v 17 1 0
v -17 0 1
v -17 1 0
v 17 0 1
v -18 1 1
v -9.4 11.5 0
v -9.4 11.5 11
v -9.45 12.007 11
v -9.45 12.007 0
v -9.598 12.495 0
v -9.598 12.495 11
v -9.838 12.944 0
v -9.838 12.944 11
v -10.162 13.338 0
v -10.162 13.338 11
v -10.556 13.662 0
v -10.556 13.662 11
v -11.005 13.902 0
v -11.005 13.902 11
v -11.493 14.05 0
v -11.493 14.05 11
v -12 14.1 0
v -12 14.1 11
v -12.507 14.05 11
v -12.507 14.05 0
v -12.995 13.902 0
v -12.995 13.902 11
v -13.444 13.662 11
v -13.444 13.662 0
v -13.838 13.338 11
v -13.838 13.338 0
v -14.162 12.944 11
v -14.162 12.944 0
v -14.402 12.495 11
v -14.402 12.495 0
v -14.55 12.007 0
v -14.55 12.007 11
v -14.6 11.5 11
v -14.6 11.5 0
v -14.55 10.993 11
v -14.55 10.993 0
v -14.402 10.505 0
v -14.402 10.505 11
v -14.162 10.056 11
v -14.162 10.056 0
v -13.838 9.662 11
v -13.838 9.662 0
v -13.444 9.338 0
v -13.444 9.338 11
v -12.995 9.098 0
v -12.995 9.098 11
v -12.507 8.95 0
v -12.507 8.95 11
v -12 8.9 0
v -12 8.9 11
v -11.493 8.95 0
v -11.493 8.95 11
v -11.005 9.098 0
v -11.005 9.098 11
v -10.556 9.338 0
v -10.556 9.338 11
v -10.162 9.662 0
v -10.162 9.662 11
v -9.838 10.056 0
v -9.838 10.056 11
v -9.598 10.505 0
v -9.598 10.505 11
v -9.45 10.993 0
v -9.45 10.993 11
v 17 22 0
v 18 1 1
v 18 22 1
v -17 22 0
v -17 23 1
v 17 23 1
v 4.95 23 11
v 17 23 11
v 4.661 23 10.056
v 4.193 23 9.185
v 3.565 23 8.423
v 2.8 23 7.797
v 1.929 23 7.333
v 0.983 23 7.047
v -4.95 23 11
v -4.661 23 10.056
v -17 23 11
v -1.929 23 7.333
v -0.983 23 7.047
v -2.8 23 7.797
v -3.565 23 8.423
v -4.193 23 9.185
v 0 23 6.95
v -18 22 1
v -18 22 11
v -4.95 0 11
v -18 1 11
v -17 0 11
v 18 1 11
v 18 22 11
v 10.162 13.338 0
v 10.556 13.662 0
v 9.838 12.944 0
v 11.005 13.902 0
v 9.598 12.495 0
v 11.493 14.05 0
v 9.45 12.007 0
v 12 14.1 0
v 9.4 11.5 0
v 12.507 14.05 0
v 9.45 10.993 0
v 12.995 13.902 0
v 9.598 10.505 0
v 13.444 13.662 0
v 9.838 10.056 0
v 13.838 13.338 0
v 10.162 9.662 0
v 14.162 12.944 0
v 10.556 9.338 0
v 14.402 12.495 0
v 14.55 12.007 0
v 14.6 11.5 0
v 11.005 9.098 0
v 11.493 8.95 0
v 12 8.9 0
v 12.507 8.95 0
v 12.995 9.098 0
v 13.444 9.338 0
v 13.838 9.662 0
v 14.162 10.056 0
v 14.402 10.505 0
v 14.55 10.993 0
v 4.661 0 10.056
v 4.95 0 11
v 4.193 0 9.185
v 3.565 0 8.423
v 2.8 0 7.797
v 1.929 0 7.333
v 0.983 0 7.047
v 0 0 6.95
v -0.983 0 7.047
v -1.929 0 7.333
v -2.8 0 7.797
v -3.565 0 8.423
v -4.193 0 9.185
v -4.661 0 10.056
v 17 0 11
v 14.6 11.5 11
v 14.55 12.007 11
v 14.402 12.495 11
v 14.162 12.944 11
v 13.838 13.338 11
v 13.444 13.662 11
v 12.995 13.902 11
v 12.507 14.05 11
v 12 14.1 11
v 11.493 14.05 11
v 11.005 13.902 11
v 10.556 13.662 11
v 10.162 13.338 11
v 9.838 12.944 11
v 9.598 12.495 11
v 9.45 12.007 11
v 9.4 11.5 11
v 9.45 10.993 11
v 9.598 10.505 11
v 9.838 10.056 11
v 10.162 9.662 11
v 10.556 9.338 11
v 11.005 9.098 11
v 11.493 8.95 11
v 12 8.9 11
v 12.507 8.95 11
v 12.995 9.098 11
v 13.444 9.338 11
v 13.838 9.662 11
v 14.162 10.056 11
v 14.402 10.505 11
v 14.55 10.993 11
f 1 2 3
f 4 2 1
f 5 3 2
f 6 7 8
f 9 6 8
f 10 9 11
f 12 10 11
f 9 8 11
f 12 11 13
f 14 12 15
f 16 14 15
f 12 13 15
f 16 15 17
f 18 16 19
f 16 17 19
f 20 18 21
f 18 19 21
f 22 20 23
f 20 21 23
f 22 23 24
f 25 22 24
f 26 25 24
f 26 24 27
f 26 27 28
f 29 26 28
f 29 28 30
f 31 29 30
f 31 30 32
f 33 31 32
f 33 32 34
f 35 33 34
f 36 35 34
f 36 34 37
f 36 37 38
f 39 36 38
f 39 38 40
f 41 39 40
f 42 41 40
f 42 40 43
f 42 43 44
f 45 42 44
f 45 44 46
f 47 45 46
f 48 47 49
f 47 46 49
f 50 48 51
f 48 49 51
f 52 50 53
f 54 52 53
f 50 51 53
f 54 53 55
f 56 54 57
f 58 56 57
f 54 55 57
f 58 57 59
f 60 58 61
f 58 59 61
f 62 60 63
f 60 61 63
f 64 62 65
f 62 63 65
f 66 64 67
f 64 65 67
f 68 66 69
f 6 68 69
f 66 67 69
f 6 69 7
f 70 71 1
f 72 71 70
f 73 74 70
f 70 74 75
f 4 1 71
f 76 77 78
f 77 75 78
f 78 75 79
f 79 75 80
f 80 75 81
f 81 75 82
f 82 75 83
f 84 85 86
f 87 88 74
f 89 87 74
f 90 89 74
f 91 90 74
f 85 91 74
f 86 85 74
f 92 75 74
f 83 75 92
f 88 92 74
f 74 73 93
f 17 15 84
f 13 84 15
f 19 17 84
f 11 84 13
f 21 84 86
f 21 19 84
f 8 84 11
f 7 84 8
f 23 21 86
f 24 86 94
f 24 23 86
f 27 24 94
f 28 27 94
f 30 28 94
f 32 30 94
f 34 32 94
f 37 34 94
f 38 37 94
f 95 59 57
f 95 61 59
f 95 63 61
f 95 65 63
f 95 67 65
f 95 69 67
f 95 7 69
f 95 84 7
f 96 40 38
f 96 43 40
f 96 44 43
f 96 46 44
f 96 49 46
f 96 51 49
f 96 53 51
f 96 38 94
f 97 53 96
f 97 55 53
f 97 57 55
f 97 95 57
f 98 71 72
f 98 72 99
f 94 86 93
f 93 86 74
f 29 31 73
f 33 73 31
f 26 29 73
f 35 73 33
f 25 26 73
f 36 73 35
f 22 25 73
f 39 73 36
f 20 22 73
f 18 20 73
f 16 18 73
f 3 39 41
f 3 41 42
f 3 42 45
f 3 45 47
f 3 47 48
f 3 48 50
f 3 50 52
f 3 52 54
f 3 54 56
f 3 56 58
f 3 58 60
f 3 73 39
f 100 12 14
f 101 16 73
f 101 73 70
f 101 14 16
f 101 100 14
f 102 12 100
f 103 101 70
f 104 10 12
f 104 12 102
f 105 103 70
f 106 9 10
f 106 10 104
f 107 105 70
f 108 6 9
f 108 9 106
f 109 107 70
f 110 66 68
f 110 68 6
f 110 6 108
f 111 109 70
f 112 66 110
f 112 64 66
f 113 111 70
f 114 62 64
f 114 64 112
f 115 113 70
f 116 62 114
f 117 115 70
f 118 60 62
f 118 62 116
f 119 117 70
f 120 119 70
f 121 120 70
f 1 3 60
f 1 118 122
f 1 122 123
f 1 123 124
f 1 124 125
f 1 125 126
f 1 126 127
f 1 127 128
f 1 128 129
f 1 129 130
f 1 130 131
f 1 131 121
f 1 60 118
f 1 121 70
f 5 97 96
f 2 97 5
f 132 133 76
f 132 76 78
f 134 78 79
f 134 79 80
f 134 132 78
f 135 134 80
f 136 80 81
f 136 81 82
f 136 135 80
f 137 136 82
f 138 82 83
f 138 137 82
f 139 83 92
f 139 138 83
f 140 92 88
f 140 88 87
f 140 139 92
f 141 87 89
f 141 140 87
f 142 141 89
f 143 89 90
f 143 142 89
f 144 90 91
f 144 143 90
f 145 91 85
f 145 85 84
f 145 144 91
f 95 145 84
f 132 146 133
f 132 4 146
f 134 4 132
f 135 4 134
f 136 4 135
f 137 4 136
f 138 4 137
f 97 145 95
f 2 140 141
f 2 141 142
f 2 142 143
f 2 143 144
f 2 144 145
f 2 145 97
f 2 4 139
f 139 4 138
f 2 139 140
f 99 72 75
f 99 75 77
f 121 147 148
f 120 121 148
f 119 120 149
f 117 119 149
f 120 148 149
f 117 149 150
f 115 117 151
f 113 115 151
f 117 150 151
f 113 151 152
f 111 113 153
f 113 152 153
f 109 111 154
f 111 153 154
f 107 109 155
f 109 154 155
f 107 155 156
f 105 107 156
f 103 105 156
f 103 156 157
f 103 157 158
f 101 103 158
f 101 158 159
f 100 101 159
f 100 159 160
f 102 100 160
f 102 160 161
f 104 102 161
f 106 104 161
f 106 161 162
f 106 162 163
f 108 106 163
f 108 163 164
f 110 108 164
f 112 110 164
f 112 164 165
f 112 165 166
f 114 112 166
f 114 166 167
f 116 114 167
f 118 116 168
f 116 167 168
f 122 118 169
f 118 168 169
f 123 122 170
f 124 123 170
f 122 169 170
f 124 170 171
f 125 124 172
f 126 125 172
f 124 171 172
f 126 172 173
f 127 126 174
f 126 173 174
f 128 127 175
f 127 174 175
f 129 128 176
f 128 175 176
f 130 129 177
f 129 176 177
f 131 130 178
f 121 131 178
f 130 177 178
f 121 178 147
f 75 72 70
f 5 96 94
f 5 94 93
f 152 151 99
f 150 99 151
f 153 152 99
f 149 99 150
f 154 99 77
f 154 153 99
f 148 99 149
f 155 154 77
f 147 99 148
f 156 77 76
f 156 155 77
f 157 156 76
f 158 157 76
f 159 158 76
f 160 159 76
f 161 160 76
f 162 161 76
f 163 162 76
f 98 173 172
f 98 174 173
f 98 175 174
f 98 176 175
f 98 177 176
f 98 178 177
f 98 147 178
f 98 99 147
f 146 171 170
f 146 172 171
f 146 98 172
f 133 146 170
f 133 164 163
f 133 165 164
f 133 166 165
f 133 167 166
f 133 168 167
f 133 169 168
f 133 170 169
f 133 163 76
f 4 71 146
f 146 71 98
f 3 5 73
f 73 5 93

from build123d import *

# Parameters (mm, degrees)
BOSS_EXTRUDE1_DEPTH = 23
CUT_EXTRUDE1_REACH  = 13
SKETCH2_R           = 2.6
CHAMFER1_SIZE       = 1


with BuildPart() as part:
    # Sketch1 → Boss-Extrude1 (new body)
    with BuildSketch(Plane(origin=(0, 0, 0), x_dir=(1, 0, 0), z_dir=(0, 1, 0))):
        with BuildLine():
            Line((-18, 0), (18, 0))
            Line((18, 0), (18, -11))
            Line((18, -11), (4.95, -11))
            ThreePointArc((4.95, -11), (0, -6.95), (-4.95, -11))
            Line((-4.95, -11), (-18, -11))
            Line((-18, -11), (-18, 0))
        make_face()
    extrude(amount=BOSS_EXTRUDE1_DEPTH)

    # Sketch2 → Cut-Extrude1 (cut, up to next)
    with BuildSketch(Plane.XY.offset(11), mode=Mode.PRIVATE) as cut_extrude1_sk1:
        with Locations((-12, 11.5)):
            Circle(SKETCH2_R)
    cut_extrude1_tool1 = extrude(cut_extrude1_sk1.sketch, amount=-CUT_EXTRUDE1_REACH, mode=Mode.PRIVATE) & part.part
    add(cut_extrude1_tool1.solids().sort_by_distance((-12, 11.5, 11))[0], mode=Mode.SUBTRACT)
    # Sketch2 → Cut-Extrude1 (cut, up to next)
    with BuildSketch(Plane.XY.offset(11), mode=Mode.PRIVATE) as cut_extrude1_sk2:
        with Locations((12, 11.5)):
            Circle(SKETCH2_R)
    cut_extrude1_tool2 = extrude(cut_extrude1_sk2.sketch, amount=-CUT_EXTRUDE1_REACH, mode=Mode.PRIVATE) & part.part
    add(cut_extrude1_tool2.solids().sort_by_distance((12, 11.5, 11))[0], mode=Mode.SUBTRACT)

    # Chamfer1
    chamfer1_edges = [part.edges().sort_by_distance(p)[0] for p in [
        (-18, 11.5, 0),
        (18, 11.5, 0),
        (18, 23, 5.5),
        (0, 23, 0),
        (-18, 23, 5.5),
        (0, 0, 0),
        (18, 0, 5.5),
        (-18, 0, 5.5),
    ]]
    chamfer(chamfer1_edges, length=CHAMFER1_SIZE)


solid = part.part
